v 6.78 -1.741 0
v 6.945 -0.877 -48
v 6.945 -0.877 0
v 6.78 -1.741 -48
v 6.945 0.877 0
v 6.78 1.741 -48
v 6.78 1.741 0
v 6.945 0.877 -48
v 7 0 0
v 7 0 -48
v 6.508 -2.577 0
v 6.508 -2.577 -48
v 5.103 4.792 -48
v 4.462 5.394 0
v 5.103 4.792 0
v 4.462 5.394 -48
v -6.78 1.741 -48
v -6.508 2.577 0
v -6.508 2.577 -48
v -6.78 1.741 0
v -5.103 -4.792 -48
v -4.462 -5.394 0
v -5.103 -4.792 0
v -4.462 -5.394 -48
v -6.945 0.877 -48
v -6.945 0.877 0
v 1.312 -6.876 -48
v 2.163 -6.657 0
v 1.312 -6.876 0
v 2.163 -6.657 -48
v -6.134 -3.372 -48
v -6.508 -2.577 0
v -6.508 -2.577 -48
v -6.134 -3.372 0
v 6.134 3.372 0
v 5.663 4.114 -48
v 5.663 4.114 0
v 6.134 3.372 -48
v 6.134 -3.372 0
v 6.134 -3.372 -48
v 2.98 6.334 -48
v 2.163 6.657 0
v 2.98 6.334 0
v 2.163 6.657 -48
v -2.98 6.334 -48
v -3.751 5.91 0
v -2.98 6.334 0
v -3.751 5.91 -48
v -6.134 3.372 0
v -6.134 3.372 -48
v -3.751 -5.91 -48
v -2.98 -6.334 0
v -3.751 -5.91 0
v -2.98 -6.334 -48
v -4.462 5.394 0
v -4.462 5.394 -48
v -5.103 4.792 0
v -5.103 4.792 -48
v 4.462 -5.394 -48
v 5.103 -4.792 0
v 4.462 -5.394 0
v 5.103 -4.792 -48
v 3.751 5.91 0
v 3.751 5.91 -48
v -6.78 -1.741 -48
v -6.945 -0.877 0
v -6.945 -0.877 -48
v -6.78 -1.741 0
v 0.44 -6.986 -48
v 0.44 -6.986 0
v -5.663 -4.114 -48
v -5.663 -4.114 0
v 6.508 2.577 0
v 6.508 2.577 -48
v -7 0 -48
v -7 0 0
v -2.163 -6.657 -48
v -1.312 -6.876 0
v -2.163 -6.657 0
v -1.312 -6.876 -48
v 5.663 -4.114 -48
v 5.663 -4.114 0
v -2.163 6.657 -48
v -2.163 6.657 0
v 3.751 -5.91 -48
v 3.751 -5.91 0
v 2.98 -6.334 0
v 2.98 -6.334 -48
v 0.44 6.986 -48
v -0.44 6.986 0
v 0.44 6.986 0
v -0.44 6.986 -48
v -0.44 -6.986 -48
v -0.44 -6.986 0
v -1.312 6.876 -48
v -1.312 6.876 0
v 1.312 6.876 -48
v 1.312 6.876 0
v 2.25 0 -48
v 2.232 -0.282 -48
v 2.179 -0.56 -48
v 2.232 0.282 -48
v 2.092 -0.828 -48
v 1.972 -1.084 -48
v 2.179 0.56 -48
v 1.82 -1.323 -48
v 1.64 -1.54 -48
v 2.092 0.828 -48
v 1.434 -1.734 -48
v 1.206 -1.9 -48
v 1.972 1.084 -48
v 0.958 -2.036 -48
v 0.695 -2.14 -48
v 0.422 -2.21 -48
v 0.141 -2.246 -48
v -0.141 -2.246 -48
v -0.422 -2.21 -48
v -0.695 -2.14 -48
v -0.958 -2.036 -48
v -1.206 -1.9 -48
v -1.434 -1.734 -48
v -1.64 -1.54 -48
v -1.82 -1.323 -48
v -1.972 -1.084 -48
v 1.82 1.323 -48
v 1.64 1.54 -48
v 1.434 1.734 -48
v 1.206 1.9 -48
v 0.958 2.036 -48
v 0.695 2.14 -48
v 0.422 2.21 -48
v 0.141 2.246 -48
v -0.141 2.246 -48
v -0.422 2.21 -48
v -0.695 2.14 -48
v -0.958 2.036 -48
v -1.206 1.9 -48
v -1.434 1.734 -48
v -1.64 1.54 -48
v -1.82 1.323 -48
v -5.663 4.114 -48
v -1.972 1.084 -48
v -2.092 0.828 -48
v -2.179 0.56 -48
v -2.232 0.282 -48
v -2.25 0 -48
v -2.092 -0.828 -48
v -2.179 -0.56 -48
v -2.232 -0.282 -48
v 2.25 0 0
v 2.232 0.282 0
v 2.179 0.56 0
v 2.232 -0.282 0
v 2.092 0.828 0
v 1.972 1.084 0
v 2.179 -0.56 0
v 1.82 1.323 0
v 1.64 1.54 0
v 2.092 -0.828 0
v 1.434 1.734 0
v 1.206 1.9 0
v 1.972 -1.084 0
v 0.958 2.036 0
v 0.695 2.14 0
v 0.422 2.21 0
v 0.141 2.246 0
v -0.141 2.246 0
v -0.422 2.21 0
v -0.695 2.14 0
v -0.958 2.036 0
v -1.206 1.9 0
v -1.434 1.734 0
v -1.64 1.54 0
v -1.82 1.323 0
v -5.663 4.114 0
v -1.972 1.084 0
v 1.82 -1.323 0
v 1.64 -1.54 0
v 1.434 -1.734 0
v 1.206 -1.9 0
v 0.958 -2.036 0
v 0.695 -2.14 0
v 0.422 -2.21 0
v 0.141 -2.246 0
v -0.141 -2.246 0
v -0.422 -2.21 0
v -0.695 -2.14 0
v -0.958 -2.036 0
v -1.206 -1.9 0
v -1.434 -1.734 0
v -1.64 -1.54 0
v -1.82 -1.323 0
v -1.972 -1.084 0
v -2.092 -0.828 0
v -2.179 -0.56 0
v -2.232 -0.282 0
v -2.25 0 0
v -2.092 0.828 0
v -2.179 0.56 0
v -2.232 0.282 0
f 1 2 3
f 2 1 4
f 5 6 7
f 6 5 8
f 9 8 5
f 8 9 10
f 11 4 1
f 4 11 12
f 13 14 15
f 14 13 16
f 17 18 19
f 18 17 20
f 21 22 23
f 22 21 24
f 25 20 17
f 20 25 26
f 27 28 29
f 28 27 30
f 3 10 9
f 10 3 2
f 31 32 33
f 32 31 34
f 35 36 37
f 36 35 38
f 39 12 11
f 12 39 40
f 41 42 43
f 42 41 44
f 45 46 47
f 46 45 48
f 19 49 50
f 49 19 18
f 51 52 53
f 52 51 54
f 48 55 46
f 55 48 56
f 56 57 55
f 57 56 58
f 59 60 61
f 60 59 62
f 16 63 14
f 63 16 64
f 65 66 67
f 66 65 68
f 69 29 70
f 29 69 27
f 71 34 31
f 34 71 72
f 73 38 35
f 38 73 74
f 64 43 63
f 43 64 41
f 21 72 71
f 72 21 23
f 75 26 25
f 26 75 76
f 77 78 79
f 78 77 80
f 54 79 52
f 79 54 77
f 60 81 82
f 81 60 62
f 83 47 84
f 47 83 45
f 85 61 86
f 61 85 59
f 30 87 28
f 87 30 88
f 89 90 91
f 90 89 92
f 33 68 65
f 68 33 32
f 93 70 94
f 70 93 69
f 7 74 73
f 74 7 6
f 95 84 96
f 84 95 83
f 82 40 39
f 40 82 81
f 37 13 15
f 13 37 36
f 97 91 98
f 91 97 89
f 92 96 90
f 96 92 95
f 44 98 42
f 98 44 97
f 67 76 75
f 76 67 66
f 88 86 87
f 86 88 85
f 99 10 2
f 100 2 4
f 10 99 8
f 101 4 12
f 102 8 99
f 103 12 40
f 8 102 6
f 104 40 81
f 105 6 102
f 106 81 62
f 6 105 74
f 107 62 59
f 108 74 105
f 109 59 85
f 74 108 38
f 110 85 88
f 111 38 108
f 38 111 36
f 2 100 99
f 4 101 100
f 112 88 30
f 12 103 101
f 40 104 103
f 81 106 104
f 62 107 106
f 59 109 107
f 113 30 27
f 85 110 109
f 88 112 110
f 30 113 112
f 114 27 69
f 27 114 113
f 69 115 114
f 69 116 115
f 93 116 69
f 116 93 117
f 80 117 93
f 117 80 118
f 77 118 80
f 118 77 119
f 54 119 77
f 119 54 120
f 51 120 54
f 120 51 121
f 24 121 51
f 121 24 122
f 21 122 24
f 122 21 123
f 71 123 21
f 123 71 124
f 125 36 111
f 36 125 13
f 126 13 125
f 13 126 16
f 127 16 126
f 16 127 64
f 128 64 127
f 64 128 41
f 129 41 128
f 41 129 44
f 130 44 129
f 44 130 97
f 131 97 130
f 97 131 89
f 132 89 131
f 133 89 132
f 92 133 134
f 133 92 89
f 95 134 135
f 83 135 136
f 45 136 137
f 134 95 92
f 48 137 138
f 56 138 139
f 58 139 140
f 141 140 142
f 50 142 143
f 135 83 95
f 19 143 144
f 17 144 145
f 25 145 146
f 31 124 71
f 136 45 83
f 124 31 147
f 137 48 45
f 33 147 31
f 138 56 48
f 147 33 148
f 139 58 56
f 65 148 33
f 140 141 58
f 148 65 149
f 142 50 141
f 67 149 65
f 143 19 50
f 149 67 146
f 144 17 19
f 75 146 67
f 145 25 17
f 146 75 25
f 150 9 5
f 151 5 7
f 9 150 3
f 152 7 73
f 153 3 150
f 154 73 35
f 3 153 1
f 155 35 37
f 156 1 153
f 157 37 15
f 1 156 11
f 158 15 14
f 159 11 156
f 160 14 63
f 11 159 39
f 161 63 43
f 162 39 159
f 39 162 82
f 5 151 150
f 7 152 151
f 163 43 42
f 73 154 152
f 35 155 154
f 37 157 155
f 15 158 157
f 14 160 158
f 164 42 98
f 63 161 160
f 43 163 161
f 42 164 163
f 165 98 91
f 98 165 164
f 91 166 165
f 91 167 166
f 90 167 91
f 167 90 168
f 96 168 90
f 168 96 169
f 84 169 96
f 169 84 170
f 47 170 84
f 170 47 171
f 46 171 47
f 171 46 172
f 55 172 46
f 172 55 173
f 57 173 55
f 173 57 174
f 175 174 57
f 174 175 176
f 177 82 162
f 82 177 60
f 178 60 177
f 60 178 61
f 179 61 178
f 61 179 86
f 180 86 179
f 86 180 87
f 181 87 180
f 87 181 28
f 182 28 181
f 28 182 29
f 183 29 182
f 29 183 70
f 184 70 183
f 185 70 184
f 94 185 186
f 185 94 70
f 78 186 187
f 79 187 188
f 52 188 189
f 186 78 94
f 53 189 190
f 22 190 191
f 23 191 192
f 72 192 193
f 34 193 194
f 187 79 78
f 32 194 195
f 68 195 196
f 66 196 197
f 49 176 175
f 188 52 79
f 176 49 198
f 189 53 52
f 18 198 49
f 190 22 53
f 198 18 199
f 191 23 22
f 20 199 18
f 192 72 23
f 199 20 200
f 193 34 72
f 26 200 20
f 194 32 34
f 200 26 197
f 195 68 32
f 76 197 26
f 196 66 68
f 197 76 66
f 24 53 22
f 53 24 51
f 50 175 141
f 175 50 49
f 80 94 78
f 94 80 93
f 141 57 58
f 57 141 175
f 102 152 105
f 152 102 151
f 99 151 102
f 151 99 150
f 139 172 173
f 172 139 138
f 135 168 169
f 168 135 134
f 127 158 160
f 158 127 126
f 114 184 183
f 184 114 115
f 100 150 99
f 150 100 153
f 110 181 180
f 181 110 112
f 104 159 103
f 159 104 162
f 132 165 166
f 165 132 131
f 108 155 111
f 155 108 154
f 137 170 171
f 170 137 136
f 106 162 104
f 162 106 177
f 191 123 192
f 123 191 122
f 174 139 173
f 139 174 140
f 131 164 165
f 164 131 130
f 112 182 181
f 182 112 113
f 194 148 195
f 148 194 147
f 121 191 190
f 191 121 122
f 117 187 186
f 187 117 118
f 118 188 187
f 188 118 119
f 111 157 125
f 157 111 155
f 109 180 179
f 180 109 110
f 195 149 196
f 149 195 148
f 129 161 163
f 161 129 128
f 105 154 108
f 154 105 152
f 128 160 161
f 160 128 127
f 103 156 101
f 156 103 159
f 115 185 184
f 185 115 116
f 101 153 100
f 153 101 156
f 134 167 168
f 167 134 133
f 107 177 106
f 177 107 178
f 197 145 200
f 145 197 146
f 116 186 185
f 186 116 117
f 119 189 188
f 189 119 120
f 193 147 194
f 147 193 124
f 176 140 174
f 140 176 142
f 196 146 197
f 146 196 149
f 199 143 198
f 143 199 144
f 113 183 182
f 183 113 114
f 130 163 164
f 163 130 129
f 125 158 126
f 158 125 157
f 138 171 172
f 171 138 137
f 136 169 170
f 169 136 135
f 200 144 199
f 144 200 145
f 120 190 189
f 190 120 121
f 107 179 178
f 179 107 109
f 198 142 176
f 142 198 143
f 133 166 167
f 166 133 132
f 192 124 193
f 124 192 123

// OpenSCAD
$fn = 50;


difference() {
	union() {
		translate(v = [0, 0, -48.0000000000]) {
			cylinder(h = 48, r = 7.0000000000);
		}
		cylinder(h = 0, r = 17.0000000000);
	}
	union() {
		#translate(v = [0, 0, -48]) {
			cylinder(h = 48, r = 2.2500000000);
		}
	}
}
